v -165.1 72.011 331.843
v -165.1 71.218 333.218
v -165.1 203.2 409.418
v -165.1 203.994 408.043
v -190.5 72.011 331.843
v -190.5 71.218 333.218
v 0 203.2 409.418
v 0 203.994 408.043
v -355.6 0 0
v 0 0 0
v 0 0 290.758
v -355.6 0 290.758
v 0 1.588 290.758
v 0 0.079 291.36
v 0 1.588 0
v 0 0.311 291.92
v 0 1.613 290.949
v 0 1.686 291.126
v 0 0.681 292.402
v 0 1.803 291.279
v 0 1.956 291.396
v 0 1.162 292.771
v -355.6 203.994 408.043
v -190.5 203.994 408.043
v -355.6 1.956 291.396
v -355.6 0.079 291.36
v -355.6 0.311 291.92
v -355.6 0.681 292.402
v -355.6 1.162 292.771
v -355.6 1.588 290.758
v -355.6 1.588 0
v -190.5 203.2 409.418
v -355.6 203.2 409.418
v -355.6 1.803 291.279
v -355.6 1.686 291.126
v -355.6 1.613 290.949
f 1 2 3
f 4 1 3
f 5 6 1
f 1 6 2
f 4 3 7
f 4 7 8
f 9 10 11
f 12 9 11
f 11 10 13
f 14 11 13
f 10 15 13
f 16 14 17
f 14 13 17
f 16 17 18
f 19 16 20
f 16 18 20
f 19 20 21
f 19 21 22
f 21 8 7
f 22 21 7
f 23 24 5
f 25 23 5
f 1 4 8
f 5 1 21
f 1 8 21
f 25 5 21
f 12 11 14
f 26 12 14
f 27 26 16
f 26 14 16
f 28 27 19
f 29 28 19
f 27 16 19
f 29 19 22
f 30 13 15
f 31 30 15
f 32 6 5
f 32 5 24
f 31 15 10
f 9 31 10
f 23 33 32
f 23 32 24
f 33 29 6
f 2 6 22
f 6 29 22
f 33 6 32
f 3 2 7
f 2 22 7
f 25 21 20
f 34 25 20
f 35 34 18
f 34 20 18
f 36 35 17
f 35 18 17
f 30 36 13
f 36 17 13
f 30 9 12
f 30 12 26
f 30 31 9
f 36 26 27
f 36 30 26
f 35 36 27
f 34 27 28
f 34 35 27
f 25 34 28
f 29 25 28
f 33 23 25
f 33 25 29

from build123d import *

# Parameters (mm, degrees)
BASE_FLANGE1_DEPTH = 355.6
SKETCH6_W          = 25.4
SKETCH6_H          = 152.4
CUT_EXTRUDE1_DEPTH = 533.597507197


# Sheet-metal steps are written as plain solids
with BuildPart() as part:
    # Sketch1 → Base-Flange1 (new body)
    with BuildSketch(Plane(origin=(0, 0, 0), x_dir=(0, 0, -1), z_dir=(1, 0, 0))):
        with BuildLine():
            Line((0, 0), (-290.758180239, 0))
            ThreePointArc((-290.758180239, 0), (-291.920230239, 0.311370359), (-292.77090988, 1.16205))
            Line((-292.77090988, 1.16205), (-409.417574699, 203.2))
            Line((-409.417574699, 203.2), (-408.042759371, 203.99375))
            Line((-408.042759371, 203.99375), (-291.396094552, 1.9558))
            ThreePointArc((-291.396094552, 1.9558), (-291.126480239, 1.686185688), (-290.758180239, 1.5875))
            Line((-290.758180239, 1.5875), (0, 1.5875))
            Line((0, 1.5875), (0, 0))
        make_face()
    extrude(amount=-BASE_FLANGE1_DEPTH)

    # Sketch6 → Cut-Extrude1 (cut, through all)
    with BuildSketch(Plane(origin=(0, -126.483010223, 219.075), x_dir=(1, 0, 0), z_dir=(0, -0.4999999999999979, 0.8660254037844399))):
        with Locations((-177.8, 304.485149399)):
            Rectangle(SKETCH6_W, SKETCH6_H)
    extrude(amount=-CUT_EXTRUDE1_DEPTH, mode=Mode.SUBTRACT)


solid = part.part
